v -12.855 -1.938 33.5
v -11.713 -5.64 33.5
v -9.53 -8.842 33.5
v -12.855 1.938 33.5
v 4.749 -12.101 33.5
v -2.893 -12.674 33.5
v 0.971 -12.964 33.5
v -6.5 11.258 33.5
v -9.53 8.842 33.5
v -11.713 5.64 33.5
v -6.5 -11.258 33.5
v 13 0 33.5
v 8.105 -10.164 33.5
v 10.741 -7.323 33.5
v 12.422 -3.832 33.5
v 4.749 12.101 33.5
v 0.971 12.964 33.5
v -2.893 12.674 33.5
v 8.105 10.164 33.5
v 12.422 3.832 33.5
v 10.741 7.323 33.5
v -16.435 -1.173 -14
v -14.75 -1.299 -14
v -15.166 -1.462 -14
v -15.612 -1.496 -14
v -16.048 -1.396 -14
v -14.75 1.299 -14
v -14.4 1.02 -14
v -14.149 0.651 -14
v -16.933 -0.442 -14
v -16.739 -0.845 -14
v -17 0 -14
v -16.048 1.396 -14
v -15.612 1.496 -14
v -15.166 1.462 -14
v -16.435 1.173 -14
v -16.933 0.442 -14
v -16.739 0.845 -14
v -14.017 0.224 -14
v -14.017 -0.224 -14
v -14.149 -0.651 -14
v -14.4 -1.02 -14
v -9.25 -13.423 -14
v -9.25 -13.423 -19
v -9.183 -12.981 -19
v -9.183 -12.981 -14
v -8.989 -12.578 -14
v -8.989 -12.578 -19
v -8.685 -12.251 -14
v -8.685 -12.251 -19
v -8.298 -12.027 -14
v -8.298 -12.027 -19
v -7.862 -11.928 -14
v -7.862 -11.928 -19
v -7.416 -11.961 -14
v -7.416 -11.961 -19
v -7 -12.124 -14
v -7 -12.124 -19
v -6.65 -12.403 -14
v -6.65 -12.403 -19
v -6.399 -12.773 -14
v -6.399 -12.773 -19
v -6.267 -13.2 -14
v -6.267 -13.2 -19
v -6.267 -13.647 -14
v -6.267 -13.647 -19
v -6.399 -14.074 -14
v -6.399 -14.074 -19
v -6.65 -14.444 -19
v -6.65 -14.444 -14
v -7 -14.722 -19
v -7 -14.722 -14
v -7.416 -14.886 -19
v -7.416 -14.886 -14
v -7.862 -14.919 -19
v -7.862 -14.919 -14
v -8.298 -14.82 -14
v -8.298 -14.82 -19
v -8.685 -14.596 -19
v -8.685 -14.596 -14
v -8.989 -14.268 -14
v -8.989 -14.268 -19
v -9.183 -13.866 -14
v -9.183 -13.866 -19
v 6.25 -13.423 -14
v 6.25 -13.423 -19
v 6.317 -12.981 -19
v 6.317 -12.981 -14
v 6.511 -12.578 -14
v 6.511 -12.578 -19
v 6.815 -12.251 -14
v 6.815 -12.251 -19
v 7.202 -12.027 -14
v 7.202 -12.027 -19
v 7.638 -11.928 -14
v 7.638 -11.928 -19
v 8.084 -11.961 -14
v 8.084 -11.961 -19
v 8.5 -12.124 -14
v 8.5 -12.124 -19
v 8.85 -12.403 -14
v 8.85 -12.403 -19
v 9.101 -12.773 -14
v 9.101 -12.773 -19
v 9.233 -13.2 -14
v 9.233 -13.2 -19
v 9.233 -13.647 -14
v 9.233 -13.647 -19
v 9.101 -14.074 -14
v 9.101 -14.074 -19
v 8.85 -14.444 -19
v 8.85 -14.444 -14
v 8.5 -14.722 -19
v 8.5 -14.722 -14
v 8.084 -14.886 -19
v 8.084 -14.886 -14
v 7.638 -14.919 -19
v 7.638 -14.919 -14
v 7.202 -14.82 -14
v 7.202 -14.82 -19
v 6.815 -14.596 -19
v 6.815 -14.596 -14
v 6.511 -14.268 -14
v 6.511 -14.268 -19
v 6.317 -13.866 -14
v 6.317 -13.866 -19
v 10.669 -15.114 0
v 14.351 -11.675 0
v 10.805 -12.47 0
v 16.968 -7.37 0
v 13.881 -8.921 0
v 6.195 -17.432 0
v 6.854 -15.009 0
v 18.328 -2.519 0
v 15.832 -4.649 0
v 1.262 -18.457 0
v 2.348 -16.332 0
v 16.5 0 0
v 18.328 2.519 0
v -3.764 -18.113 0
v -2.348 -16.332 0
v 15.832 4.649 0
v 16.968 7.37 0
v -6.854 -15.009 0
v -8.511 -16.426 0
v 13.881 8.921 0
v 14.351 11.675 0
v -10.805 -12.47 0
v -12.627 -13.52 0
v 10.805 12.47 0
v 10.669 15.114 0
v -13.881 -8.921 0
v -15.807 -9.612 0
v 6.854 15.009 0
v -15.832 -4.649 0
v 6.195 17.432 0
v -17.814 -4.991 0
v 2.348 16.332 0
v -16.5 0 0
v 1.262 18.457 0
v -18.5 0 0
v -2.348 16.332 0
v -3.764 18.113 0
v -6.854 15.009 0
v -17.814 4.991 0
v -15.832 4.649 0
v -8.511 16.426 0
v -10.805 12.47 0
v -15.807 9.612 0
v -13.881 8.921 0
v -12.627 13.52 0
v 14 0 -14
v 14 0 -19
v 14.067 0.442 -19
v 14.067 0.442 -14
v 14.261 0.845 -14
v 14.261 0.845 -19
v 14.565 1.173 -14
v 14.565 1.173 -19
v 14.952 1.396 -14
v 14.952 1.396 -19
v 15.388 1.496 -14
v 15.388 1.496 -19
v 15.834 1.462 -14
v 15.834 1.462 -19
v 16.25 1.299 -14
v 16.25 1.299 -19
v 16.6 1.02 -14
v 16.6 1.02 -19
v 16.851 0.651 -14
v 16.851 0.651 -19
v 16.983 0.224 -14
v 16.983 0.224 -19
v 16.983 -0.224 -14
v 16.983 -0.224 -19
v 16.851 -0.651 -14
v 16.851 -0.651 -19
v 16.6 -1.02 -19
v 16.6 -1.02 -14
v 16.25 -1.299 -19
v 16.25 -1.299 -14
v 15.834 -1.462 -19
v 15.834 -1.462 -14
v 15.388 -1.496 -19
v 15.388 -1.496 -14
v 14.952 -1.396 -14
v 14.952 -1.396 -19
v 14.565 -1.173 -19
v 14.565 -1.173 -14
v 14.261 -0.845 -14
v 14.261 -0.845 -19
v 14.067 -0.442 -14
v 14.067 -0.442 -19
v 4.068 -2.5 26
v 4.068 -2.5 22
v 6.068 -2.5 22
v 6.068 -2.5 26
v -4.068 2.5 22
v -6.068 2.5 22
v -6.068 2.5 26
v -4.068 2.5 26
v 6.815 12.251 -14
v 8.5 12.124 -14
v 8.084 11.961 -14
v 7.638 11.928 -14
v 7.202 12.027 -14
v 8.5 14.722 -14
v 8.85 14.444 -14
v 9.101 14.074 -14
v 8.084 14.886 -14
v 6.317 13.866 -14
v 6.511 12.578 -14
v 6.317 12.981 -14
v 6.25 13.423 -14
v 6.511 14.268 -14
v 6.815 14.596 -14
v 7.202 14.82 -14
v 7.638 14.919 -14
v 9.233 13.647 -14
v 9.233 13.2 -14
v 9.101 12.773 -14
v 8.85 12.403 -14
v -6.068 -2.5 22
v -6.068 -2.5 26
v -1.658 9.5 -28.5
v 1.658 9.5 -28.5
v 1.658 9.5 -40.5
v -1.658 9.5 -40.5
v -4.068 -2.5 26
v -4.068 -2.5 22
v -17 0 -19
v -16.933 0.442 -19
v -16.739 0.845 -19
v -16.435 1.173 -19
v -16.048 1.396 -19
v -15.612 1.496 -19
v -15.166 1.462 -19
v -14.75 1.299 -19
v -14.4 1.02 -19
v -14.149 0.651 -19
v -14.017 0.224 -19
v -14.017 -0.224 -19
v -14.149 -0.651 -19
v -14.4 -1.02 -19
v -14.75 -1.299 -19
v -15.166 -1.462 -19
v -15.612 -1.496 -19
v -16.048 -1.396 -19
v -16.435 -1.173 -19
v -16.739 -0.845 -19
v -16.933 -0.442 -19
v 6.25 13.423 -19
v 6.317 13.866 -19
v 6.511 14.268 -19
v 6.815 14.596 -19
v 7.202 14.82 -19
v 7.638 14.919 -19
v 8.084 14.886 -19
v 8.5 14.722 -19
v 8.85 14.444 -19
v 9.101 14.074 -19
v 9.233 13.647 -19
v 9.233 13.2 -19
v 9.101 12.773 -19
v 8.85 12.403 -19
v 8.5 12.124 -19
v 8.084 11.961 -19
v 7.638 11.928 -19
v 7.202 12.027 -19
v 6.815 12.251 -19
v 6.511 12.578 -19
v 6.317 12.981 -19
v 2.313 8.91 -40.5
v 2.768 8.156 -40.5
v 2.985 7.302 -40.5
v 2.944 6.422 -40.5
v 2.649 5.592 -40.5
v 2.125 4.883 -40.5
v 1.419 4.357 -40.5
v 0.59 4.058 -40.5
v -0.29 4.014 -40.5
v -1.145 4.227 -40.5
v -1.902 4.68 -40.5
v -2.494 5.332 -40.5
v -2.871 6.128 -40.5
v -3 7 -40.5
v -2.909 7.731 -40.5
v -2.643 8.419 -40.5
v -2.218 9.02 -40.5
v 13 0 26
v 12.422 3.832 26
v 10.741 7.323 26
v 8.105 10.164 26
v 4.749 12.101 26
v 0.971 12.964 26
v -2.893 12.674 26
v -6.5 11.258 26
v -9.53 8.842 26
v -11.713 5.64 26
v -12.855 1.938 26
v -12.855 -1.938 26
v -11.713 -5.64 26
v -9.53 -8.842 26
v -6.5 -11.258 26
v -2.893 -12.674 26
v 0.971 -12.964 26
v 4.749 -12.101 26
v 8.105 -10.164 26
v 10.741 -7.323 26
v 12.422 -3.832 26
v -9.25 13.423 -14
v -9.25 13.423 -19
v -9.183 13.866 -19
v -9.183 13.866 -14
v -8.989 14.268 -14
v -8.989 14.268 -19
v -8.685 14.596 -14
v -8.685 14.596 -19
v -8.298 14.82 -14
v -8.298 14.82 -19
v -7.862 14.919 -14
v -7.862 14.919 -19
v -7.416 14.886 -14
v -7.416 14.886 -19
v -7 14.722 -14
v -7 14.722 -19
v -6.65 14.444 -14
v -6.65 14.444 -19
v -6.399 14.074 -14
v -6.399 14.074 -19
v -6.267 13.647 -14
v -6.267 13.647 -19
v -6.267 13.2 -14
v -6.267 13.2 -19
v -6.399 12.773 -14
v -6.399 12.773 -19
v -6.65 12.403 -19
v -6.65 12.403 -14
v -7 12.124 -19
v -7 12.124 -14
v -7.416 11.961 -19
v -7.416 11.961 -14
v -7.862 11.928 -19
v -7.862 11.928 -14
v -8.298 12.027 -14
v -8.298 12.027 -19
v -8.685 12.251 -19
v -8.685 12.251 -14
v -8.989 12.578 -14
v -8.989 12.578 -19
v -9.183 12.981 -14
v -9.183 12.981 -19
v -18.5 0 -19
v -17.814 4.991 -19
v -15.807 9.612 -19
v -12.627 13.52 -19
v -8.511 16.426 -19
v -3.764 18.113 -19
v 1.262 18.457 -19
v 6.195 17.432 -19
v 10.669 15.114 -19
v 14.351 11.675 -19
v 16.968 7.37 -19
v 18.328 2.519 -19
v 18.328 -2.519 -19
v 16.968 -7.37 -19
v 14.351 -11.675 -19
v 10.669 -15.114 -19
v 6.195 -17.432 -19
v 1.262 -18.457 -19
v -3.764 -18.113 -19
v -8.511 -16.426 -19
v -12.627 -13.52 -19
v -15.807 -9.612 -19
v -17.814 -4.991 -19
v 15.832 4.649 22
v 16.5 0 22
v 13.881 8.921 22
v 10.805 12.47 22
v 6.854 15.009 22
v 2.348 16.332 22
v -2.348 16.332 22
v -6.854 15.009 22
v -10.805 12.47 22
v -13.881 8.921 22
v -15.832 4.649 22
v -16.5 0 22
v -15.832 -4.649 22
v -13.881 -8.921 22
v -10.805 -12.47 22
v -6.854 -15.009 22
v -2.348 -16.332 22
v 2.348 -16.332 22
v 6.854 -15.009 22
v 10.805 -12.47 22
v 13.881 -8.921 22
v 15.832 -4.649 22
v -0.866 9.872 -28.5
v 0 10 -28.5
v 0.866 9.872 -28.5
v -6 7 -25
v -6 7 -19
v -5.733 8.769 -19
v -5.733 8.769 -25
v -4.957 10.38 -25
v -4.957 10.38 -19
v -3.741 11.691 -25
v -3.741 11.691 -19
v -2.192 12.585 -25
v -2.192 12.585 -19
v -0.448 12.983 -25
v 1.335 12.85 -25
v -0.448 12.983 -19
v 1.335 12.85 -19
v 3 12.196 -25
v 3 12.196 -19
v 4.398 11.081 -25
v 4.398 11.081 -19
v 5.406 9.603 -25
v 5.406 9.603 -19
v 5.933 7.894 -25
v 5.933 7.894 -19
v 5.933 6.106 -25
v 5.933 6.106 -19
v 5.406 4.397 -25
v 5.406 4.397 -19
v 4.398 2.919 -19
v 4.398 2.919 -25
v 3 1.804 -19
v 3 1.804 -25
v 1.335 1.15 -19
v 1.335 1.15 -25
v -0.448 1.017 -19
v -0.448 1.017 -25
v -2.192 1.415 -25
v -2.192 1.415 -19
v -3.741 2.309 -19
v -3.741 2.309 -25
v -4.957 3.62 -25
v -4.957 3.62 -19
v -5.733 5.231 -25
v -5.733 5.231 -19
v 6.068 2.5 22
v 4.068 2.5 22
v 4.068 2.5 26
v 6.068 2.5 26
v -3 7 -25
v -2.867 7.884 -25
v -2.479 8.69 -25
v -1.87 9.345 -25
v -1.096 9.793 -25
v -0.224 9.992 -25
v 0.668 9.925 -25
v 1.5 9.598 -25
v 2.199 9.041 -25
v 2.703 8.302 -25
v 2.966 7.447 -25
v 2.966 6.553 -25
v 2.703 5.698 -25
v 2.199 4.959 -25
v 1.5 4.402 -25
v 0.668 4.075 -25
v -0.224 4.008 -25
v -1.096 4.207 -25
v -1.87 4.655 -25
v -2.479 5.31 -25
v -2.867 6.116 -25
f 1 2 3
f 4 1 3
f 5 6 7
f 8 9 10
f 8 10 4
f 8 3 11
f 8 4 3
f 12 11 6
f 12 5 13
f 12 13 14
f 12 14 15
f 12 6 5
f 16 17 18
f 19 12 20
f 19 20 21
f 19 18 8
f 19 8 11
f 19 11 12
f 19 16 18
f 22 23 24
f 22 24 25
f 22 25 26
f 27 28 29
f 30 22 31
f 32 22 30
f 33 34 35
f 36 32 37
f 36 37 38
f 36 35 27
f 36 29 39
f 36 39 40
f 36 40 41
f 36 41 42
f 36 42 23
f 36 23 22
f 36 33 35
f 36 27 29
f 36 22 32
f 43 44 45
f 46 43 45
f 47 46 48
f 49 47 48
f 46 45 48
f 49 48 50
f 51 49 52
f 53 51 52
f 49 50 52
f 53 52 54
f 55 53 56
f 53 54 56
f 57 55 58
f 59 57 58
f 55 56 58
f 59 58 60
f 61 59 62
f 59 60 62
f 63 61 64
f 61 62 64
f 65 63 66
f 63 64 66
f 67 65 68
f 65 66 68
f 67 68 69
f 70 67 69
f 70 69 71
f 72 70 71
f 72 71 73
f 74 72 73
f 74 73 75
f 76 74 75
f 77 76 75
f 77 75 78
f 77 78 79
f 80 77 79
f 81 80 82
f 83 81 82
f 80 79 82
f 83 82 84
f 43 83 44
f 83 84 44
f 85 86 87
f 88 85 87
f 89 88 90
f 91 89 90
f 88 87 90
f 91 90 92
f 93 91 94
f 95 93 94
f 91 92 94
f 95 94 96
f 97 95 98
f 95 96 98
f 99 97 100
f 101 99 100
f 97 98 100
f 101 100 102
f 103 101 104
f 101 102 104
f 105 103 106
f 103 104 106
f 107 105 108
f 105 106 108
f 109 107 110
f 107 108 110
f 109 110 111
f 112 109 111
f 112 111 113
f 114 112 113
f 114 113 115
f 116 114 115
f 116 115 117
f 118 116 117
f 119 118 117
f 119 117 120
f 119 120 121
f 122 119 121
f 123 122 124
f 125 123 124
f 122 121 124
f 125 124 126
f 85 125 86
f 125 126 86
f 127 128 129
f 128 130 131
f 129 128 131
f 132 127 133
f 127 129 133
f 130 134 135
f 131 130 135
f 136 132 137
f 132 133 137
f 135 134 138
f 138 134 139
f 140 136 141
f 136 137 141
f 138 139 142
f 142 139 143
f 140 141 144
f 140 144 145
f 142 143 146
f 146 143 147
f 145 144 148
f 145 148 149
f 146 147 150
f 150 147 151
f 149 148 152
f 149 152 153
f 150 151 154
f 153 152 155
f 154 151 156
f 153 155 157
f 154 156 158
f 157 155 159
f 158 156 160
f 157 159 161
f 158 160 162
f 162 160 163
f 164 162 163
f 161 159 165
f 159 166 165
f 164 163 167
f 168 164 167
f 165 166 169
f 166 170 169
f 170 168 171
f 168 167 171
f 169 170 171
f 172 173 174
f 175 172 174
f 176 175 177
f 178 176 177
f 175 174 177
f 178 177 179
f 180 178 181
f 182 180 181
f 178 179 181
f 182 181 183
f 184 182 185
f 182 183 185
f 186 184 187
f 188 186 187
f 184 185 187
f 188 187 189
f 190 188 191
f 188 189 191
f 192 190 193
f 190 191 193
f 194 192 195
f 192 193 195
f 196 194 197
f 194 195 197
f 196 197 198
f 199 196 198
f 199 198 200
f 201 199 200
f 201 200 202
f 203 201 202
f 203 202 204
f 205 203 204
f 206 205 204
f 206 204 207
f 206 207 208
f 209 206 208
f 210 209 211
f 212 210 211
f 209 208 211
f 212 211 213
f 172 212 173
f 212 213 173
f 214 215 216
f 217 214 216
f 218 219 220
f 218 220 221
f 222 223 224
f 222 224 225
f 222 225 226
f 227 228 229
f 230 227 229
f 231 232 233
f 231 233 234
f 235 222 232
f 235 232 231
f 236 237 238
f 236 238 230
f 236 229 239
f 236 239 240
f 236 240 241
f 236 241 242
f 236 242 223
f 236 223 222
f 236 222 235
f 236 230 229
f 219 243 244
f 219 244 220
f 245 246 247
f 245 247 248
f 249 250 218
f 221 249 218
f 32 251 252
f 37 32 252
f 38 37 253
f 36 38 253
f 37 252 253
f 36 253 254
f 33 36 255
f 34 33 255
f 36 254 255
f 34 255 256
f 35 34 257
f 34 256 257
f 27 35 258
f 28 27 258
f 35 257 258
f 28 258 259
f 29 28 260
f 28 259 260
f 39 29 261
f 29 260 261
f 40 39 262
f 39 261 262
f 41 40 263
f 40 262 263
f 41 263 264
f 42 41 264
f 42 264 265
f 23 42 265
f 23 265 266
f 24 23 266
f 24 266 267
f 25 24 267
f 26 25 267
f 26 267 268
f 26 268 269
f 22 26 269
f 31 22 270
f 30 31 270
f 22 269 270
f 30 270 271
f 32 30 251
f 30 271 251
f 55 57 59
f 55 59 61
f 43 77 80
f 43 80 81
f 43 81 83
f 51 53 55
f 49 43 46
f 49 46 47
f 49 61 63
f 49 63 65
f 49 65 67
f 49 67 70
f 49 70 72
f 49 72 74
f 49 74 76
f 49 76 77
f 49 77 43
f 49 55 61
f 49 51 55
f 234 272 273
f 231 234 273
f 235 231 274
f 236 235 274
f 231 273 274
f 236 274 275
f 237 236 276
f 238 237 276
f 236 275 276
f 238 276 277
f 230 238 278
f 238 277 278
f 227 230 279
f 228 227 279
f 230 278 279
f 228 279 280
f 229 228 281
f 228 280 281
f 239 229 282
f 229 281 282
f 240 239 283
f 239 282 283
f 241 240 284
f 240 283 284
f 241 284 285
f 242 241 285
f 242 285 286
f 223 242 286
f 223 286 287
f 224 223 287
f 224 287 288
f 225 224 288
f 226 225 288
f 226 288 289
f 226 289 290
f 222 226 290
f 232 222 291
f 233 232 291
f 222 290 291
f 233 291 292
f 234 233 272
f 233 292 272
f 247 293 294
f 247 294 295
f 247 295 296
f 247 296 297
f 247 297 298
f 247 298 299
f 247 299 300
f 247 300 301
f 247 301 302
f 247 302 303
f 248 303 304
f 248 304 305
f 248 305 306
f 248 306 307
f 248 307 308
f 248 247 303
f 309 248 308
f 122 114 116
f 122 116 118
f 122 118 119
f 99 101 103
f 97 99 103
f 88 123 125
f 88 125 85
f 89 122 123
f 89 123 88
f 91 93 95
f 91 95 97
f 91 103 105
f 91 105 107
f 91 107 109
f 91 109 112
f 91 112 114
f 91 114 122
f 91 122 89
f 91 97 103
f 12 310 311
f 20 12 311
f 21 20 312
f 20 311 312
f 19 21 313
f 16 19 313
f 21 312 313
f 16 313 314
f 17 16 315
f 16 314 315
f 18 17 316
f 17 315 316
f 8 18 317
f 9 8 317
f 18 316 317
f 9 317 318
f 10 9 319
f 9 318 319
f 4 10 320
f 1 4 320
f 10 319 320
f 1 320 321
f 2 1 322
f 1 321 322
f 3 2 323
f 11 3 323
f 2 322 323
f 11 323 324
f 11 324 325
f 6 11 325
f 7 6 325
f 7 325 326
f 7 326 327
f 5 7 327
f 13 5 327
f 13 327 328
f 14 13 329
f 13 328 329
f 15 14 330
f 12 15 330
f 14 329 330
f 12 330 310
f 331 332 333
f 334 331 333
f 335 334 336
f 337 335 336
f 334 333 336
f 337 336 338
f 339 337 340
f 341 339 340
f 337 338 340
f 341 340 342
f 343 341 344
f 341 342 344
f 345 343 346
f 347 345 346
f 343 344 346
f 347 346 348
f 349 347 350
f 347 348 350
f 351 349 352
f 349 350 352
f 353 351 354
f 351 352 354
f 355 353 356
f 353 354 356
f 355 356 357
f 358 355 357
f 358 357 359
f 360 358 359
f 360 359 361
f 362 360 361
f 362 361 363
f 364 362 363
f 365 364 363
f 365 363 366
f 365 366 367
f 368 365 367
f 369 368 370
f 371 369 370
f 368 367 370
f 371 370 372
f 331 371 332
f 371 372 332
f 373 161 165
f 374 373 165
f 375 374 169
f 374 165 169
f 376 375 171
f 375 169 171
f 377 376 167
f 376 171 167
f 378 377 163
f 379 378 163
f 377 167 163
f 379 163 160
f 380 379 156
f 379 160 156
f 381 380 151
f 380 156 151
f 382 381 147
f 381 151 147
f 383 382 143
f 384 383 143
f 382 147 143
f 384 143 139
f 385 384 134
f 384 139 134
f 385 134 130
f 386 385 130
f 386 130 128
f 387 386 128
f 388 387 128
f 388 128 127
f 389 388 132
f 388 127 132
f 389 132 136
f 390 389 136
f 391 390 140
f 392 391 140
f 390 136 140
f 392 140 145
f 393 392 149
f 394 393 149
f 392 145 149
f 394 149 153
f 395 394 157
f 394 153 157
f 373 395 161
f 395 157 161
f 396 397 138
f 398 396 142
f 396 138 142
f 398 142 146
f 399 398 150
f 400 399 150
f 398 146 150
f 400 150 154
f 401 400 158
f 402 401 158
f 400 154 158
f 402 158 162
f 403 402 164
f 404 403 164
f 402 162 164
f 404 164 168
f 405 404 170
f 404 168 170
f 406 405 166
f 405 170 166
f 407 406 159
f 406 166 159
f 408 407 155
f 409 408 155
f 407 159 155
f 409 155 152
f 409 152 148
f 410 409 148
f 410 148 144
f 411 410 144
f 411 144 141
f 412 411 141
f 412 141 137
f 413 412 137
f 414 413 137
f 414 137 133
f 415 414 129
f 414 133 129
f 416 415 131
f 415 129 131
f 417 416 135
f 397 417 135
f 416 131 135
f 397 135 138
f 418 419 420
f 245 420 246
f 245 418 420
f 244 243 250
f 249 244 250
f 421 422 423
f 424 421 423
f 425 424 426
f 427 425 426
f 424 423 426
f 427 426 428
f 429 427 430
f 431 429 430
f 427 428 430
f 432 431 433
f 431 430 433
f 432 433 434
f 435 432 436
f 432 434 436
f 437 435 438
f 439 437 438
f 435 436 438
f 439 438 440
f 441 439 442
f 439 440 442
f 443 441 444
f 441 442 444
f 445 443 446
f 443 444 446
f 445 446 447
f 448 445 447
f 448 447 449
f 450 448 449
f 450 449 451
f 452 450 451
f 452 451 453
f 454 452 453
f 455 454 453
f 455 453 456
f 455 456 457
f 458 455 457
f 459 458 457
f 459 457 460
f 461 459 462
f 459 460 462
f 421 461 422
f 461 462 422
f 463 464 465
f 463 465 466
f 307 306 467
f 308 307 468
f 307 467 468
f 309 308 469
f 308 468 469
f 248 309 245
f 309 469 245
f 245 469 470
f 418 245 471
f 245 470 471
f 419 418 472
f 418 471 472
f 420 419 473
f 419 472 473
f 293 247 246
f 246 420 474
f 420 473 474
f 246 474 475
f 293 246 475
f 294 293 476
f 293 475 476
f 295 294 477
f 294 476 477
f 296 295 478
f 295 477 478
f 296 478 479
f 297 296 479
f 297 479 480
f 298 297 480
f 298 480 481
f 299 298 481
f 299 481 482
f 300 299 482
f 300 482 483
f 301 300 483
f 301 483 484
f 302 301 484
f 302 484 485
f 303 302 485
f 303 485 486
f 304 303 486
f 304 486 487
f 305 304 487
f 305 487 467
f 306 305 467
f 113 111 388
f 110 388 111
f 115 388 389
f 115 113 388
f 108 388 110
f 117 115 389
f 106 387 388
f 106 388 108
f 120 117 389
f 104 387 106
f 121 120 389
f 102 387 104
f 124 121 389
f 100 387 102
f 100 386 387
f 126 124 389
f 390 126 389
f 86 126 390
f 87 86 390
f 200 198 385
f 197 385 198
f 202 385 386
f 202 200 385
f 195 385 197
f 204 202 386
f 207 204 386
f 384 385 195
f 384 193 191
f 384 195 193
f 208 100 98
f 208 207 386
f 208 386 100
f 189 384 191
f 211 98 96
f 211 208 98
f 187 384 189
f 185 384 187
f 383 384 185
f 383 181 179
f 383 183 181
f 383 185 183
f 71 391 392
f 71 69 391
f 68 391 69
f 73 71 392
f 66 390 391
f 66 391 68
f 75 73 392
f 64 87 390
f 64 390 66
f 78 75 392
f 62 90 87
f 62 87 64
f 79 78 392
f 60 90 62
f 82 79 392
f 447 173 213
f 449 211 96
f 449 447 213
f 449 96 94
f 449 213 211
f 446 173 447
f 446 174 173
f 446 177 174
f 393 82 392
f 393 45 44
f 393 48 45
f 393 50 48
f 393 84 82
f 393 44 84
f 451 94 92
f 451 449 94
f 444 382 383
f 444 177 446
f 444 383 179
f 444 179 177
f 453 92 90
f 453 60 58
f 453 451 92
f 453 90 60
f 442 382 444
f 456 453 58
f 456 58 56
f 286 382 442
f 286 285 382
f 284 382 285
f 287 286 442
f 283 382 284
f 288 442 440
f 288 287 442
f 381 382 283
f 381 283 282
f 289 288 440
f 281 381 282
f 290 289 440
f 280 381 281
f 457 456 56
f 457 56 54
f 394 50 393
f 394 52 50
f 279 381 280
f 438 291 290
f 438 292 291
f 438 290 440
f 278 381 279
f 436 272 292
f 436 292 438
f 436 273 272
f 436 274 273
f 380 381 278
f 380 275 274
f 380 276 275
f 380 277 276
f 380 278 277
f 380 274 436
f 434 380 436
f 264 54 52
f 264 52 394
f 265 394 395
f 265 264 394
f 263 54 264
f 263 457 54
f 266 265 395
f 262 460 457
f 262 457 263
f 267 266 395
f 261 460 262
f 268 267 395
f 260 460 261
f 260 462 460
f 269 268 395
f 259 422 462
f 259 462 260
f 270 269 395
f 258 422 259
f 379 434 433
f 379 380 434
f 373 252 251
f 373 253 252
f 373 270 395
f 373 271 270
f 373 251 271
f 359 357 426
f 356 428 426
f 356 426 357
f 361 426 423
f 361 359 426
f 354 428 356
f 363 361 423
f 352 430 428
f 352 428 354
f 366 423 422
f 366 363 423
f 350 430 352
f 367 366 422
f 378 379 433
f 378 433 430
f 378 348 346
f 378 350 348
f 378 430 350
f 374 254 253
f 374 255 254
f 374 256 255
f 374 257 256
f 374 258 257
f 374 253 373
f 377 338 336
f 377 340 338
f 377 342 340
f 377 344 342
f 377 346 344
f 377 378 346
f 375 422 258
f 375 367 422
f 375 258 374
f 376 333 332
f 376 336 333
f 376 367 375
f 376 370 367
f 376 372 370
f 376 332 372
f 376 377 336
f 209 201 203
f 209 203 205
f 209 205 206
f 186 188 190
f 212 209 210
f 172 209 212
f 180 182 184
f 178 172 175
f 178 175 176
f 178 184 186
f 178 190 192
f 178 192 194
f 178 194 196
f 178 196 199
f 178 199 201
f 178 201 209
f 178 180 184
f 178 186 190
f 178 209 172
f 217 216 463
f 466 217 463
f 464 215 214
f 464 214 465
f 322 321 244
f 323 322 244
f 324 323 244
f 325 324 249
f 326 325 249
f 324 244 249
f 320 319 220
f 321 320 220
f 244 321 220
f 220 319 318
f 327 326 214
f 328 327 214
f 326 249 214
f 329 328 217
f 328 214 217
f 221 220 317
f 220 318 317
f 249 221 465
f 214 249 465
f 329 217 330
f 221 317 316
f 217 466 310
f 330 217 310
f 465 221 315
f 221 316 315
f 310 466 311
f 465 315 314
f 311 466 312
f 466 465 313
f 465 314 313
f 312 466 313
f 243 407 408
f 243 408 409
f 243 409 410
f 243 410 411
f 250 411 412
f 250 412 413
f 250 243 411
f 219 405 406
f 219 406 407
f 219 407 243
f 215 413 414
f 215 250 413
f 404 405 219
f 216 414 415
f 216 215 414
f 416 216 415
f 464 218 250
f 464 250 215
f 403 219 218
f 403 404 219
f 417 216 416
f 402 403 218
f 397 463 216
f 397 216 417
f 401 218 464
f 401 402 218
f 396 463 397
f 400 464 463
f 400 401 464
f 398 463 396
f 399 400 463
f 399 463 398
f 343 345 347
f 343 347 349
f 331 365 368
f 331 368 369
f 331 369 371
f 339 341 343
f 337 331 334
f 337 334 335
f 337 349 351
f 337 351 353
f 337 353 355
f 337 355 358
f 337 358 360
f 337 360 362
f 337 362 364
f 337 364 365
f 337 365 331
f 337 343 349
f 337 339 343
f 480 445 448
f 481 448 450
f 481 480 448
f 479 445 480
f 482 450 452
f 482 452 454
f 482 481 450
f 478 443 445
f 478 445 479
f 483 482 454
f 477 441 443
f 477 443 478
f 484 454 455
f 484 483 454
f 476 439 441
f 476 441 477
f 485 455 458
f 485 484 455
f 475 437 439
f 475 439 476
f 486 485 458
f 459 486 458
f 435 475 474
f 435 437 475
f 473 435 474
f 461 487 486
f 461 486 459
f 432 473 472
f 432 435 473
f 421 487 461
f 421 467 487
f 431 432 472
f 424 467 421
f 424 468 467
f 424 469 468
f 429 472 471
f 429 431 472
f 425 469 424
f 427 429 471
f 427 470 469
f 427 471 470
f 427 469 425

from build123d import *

# Parameters (mm, degrees)
SKETCH1_R           = 16.5
BOSS_EXTRUDE1_DEPTH = 22
SKETCH2_R           = 18.5
BOSS_EXTRUDE2_DEPTH = 19
SKETCH3_R           = 6
BOSS_EXTRUDE3_DEPTH = 6
SKETCH4_R           = 3
BOSS_EXTRUDE4_DEPTH = 15.5
CUT_EXTRUDE1_DEPTH  = 12
SKETCH6_R           = 1.5
CUT_EXTRUDE2_DEPTH  = 5
BOSS_EXTRUDE5_START = 4
SKETCH7_R           = 13
BOSS_EXTRUDE5_DEPTH = 7.5
SKETCH8_W           = 2
SKETCH8_H           = 5
BOSS_EXTRUDE6_DEPTH = 4


with BuildPart() as part:
    # Sketch1 → Boss-Extrude1 (new body)
    with BuildSketch(Plane.XY):
        Circle(SKETCH1_R)
    extrude(amount=BOSS_EXTRUDE1_DEPTH)

    # Sketch2 → Boss-Extrude2 (add)
    with BuildSketch(Plane(origin=(0, 0, 0), x_dir=(-1, 0, 0), z_dir=(0, 0, -1))):
        Circle(SKETCH2_R)
    extrude(amount=BOSS_EXTRUDE2_DEPTH)

    # Sketch3 → Boss-Extrude3 (add)
    with BuildSketch(Plane(origin=(0, 0, -19), x_dir=(-1, 0, 0), z_dir=(0, 0, -1))):
        with Locations((0, 7)):
            Circle(SKETCH3_R)
    extrude(amount=BOSS_EXTRUDE3_DEPTH)

    # Sketch4 → Boss-Extrude4 (add)
    with BuildSketch(Plane(origin=(0, 0, -25), x_dir=(-1, 0, 0), z_dir=(0, 0, -1))):
        with Locations((0, 7)):
            Circle(SKETCH4_R)
    extrude(amount=BOSS_EXTRUDE4_DEPTH)

    # Sketch5 → Cut-Extrude1 (cut)
    with BuildSketch(Plane(origin=(0, 0, -40.5), x_dir=(-1, 0, 0), z_dir=(0, 0, -1))):
        Polygon((-80.661429966, 9.5), (-1.658312395, 9.5), (1.658312395, 9.5), (80.661429966, 9.5), (80.661429966, 167.506235142), (-80.661429966, 167.506235142), align=None)
    extrude(amount=-CUT_EXTRUDE1_DEPTH, mode=Mode.SUBTRACT)

    # Sketch6 → Cut-Extrude2 (cut)
    with BuildSketch(Plane(origin=(0, 0, -19), x_dir=(-1, 0, 0), z_dir=(0, 0, -1))):
        with Locations((-15.5, 0)):
            Circle(SKETCH6_R)
        with Locations((-7.75, 13.423393759)):
            Circle(SKETCH6_R)
        with Locations((7.75, 13.423393759)):
            Circle(SKETCH6_R)
        with Locations((15.5, 0)):
            Circle(SKETCH6_R)
        with Locations((7.75, -13.423393759)):
            Circle(SKETCH6_R)
        with Locations((-7.75, -13.423393759)):
            Circle(SKETCH6_R)
    extrude(amount=-CUT_EXTRUDE2_DEPTH, mode=Mode.SUBTRACT)



with BuildPart() as body_2:
    # Sketch7 → Boss-Extrude5 (new body)
    with BuildSketch(Plane.XY.offset(22).offset(BOSS_EXTRUDE5_START)):
        Circle(SKETCH7_R)
    extrude(amount=BOSS_EXTRUDE5_DEPTH)


with BuildPart() as part_1:
    add(part.part)

    add(body_2.part)  # Boss-Extrude6 merges body 2
    # Sketch8 → Boss-Extrude6 (add)
    with BuildSketch(Plane.XY.offset(22)):
        with Locations((-5.068135622, 0)):
            Rectangle(SKETCH8_W, SKETCH8_H)
        with Locations((5.068135622, 0)):
            Rectangle(SKETCH8_W, SKETCH8_H)
    extrude(amount=BOSS_EXTRUDE6_DEPTH)


solid = part_1.part
